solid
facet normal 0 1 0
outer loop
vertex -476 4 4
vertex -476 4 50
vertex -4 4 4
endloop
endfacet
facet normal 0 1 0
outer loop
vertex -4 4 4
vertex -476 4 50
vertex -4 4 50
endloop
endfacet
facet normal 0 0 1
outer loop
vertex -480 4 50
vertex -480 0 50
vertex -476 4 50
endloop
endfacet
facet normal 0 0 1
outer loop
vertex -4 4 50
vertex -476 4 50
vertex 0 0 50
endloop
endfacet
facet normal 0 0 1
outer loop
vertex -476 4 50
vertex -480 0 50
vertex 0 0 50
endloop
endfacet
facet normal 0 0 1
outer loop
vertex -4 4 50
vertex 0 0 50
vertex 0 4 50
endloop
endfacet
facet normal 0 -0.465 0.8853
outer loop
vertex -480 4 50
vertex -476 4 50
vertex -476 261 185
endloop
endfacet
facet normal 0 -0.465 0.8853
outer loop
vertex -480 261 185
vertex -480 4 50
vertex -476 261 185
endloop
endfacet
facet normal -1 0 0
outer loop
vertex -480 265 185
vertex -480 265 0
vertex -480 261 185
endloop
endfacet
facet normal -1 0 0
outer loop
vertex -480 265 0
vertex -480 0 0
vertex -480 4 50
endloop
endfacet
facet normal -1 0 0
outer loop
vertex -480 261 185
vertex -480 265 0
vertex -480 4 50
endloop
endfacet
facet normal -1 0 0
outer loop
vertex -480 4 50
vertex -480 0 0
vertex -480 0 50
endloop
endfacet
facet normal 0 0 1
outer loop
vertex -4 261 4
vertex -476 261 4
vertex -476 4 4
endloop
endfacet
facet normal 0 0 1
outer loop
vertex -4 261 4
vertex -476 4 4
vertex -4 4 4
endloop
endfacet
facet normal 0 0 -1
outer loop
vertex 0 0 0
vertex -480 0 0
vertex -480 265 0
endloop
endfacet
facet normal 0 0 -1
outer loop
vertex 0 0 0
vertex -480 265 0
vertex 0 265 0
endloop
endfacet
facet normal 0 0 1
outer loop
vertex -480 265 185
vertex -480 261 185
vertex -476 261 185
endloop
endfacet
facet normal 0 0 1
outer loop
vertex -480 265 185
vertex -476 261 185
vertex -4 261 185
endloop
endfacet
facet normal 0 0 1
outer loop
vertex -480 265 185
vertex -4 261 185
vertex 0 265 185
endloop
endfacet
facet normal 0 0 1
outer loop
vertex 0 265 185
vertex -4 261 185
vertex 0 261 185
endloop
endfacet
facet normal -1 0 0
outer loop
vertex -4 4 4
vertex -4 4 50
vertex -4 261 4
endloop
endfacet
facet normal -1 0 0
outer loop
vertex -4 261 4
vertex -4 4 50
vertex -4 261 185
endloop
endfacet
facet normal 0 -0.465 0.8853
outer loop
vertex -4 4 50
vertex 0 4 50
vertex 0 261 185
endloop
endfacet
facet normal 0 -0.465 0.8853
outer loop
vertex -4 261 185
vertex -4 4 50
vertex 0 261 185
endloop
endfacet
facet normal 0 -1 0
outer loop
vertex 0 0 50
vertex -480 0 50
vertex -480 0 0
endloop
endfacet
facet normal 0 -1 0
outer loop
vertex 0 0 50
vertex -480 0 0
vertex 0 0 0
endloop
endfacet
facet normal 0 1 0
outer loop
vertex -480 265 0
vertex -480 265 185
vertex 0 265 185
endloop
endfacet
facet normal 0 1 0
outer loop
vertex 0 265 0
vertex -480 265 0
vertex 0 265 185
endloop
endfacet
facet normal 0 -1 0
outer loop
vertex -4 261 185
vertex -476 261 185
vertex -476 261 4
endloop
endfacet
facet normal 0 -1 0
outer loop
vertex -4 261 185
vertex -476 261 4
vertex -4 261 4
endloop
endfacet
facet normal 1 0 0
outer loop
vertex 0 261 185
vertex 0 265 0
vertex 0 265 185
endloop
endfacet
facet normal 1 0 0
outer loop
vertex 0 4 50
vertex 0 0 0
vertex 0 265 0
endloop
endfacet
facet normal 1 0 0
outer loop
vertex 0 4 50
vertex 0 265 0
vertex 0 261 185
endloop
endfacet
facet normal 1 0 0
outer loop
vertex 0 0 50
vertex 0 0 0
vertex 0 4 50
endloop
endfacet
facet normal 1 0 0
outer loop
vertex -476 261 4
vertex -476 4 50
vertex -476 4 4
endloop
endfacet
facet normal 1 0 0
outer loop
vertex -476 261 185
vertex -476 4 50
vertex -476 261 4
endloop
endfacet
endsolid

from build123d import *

# Parameters (mm, degrees)
F0_W     = 480
F0_H     = 185
F1_DEPTH = 265
F3_DEPTH = 480
F5_W     = 472
F5_H     = 257
F6_DEPTH = 181


with BuildPart() as f1:
    # F0 (on Front) → F1 (new body)
    with BuildSketch(Plane.XZ):
        with Locations((-240, 92.5)):
            Rectangle(F0_W, F0_H)
    extrude(amount=-F1_DEPTH)

    # F2 (on Right) → F3 (cut, through all)
    with BuildSketch(Plane.YZ):
        Polygon((0, 50), (4, 50), (261, 185), (0, 185), align=None)
    extrude(amount=-F3_DEPTH, mode=Mode.SUBTRACT)

    # F5 (on plane+point) → F6 (cut)
    with BuildSketch(Plane.XY.offset(185)):
        with Locations((-240, 132.5)):
            Rectangle(F5_W, F5_H)
    extrude(amount=-F6_DEPTH, mode=Mode.SUBTRACT)


solid = f1.part
